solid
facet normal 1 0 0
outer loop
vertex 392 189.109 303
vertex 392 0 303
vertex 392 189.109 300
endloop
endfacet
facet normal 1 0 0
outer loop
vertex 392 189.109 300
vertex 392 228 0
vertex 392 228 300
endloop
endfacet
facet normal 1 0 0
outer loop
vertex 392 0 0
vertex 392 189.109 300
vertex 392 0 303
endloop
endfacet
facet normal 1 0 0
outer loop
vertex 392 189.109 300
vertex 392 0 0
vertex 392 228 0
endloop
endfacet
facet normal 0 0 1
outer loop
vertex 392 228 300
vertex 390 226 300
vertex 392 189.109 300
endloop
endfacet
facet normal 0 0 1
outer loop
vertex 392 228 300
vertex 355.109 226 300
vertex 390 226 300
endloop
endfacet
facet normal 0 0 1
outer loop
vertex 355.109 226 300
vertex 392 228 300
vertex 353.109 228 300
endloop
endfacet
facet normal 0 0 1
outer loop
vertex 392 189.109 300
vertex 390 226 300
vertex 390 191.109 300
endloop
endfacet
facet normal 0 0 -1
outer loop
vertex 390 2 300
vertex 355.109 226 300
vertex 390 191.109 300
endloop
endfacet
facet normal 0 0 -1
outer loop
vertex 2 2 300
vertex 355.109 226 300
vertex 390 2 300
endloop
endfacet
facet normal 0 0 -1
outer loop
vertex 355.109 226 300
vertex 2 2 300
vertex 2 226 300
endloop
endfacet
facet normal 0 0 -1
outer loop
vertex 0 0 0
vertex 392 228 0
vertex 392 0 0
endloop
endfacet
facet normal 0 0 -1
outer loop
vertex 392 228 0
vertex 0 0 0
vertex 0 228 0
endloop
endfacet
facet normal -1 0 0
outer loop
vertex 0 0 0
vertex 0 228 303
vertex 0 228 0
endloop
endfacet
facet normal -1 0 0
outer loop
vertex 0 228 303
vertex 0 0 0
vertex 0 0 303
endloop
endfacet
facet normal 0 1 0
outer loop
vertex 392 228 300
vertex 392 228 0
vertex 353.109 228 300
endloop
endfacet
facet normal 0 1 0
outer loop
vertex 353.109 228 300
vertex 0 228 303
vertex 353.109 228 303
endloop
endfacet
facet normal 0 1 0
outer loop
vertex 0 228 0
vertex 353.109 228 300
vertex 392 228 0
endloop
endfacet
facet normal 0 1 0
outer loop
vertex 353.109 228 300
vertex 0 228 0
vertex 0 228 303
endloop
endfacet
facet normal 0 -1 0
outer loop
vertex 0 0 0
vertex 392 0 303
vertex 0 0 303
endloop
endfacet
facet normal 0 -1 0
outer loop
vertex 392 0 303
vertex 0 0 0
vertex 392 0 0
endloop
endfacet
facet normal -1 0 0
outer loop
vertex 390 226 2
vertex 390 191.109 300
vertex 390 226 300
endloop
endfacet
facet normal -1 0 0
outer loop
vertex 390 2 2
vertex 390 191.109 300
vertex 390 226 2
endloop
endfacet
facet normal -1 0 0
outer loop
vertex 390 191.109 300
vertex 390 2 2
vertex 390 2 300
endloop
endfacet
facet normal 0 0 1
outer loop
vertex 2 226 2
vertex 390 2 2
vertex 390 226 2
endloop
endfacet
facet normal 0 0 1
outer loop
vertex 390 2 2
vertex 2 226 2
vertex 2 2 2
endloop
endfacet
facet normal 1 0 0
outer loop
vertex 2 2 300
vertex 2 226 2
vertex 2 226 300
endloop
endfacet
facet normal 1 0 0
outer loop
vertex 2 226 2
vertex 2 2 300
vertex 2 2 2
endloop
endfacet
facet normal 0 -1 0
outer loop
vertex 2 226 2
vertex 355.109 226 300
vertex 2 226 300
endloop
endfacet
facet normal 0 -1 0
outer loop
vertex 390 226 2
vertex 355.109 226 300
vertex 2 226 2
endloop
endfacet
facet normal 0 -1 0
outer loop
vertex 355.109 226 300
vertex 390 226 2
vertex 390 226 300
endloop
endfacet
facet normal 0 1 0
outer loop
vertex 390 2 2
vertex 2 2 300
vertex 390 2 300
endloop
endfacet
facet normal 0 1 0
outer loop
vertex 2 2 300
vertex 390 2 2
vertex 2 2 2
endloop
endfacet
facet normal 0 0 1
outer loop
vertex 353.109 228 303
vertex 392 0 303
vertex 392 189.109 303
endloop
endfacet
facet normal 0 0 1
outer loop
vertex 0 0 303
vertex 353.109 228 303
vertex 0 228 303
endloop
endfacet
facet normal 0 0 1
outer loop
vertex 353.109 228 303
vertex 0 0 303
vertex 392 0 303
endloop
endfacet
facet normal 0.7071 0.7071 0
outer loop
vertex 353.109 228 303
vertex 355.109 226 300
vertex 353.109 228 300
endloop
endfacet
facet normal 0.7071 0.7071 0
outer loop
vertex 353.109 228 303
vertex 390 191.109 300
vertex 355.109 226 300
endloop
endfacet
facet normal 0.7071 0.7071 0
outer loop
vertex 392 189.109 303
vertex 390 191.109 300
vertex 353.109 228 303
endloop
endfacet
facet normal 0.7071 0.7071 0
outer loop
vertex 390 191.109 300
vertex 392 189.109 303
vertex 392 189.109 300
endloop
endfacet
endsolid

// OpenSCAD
$fn=100;

module tank(cover=false,body=true){
    if (body) {
        color([0.7,0.7,0.7,1])
        difference(){
            cube(size=[392, 228, 300]);
            translate([2, 2, 2])
            cube(size=[388, 224, 300]);
        }
    }
    color([0.3,0.7,0.5,1])
    translate([0,0,300])
    difference(){
        cube(size=[392, 228, 3]);
        translate([392,228,0])
        rotate([0, 0, 45])
        cube(size=[55, 55, 10], center=true);
        
    }

    if (cover) {
        translate([0,0,325])
        cube(size=[372, 228, 10]);
    }
}

tank();
